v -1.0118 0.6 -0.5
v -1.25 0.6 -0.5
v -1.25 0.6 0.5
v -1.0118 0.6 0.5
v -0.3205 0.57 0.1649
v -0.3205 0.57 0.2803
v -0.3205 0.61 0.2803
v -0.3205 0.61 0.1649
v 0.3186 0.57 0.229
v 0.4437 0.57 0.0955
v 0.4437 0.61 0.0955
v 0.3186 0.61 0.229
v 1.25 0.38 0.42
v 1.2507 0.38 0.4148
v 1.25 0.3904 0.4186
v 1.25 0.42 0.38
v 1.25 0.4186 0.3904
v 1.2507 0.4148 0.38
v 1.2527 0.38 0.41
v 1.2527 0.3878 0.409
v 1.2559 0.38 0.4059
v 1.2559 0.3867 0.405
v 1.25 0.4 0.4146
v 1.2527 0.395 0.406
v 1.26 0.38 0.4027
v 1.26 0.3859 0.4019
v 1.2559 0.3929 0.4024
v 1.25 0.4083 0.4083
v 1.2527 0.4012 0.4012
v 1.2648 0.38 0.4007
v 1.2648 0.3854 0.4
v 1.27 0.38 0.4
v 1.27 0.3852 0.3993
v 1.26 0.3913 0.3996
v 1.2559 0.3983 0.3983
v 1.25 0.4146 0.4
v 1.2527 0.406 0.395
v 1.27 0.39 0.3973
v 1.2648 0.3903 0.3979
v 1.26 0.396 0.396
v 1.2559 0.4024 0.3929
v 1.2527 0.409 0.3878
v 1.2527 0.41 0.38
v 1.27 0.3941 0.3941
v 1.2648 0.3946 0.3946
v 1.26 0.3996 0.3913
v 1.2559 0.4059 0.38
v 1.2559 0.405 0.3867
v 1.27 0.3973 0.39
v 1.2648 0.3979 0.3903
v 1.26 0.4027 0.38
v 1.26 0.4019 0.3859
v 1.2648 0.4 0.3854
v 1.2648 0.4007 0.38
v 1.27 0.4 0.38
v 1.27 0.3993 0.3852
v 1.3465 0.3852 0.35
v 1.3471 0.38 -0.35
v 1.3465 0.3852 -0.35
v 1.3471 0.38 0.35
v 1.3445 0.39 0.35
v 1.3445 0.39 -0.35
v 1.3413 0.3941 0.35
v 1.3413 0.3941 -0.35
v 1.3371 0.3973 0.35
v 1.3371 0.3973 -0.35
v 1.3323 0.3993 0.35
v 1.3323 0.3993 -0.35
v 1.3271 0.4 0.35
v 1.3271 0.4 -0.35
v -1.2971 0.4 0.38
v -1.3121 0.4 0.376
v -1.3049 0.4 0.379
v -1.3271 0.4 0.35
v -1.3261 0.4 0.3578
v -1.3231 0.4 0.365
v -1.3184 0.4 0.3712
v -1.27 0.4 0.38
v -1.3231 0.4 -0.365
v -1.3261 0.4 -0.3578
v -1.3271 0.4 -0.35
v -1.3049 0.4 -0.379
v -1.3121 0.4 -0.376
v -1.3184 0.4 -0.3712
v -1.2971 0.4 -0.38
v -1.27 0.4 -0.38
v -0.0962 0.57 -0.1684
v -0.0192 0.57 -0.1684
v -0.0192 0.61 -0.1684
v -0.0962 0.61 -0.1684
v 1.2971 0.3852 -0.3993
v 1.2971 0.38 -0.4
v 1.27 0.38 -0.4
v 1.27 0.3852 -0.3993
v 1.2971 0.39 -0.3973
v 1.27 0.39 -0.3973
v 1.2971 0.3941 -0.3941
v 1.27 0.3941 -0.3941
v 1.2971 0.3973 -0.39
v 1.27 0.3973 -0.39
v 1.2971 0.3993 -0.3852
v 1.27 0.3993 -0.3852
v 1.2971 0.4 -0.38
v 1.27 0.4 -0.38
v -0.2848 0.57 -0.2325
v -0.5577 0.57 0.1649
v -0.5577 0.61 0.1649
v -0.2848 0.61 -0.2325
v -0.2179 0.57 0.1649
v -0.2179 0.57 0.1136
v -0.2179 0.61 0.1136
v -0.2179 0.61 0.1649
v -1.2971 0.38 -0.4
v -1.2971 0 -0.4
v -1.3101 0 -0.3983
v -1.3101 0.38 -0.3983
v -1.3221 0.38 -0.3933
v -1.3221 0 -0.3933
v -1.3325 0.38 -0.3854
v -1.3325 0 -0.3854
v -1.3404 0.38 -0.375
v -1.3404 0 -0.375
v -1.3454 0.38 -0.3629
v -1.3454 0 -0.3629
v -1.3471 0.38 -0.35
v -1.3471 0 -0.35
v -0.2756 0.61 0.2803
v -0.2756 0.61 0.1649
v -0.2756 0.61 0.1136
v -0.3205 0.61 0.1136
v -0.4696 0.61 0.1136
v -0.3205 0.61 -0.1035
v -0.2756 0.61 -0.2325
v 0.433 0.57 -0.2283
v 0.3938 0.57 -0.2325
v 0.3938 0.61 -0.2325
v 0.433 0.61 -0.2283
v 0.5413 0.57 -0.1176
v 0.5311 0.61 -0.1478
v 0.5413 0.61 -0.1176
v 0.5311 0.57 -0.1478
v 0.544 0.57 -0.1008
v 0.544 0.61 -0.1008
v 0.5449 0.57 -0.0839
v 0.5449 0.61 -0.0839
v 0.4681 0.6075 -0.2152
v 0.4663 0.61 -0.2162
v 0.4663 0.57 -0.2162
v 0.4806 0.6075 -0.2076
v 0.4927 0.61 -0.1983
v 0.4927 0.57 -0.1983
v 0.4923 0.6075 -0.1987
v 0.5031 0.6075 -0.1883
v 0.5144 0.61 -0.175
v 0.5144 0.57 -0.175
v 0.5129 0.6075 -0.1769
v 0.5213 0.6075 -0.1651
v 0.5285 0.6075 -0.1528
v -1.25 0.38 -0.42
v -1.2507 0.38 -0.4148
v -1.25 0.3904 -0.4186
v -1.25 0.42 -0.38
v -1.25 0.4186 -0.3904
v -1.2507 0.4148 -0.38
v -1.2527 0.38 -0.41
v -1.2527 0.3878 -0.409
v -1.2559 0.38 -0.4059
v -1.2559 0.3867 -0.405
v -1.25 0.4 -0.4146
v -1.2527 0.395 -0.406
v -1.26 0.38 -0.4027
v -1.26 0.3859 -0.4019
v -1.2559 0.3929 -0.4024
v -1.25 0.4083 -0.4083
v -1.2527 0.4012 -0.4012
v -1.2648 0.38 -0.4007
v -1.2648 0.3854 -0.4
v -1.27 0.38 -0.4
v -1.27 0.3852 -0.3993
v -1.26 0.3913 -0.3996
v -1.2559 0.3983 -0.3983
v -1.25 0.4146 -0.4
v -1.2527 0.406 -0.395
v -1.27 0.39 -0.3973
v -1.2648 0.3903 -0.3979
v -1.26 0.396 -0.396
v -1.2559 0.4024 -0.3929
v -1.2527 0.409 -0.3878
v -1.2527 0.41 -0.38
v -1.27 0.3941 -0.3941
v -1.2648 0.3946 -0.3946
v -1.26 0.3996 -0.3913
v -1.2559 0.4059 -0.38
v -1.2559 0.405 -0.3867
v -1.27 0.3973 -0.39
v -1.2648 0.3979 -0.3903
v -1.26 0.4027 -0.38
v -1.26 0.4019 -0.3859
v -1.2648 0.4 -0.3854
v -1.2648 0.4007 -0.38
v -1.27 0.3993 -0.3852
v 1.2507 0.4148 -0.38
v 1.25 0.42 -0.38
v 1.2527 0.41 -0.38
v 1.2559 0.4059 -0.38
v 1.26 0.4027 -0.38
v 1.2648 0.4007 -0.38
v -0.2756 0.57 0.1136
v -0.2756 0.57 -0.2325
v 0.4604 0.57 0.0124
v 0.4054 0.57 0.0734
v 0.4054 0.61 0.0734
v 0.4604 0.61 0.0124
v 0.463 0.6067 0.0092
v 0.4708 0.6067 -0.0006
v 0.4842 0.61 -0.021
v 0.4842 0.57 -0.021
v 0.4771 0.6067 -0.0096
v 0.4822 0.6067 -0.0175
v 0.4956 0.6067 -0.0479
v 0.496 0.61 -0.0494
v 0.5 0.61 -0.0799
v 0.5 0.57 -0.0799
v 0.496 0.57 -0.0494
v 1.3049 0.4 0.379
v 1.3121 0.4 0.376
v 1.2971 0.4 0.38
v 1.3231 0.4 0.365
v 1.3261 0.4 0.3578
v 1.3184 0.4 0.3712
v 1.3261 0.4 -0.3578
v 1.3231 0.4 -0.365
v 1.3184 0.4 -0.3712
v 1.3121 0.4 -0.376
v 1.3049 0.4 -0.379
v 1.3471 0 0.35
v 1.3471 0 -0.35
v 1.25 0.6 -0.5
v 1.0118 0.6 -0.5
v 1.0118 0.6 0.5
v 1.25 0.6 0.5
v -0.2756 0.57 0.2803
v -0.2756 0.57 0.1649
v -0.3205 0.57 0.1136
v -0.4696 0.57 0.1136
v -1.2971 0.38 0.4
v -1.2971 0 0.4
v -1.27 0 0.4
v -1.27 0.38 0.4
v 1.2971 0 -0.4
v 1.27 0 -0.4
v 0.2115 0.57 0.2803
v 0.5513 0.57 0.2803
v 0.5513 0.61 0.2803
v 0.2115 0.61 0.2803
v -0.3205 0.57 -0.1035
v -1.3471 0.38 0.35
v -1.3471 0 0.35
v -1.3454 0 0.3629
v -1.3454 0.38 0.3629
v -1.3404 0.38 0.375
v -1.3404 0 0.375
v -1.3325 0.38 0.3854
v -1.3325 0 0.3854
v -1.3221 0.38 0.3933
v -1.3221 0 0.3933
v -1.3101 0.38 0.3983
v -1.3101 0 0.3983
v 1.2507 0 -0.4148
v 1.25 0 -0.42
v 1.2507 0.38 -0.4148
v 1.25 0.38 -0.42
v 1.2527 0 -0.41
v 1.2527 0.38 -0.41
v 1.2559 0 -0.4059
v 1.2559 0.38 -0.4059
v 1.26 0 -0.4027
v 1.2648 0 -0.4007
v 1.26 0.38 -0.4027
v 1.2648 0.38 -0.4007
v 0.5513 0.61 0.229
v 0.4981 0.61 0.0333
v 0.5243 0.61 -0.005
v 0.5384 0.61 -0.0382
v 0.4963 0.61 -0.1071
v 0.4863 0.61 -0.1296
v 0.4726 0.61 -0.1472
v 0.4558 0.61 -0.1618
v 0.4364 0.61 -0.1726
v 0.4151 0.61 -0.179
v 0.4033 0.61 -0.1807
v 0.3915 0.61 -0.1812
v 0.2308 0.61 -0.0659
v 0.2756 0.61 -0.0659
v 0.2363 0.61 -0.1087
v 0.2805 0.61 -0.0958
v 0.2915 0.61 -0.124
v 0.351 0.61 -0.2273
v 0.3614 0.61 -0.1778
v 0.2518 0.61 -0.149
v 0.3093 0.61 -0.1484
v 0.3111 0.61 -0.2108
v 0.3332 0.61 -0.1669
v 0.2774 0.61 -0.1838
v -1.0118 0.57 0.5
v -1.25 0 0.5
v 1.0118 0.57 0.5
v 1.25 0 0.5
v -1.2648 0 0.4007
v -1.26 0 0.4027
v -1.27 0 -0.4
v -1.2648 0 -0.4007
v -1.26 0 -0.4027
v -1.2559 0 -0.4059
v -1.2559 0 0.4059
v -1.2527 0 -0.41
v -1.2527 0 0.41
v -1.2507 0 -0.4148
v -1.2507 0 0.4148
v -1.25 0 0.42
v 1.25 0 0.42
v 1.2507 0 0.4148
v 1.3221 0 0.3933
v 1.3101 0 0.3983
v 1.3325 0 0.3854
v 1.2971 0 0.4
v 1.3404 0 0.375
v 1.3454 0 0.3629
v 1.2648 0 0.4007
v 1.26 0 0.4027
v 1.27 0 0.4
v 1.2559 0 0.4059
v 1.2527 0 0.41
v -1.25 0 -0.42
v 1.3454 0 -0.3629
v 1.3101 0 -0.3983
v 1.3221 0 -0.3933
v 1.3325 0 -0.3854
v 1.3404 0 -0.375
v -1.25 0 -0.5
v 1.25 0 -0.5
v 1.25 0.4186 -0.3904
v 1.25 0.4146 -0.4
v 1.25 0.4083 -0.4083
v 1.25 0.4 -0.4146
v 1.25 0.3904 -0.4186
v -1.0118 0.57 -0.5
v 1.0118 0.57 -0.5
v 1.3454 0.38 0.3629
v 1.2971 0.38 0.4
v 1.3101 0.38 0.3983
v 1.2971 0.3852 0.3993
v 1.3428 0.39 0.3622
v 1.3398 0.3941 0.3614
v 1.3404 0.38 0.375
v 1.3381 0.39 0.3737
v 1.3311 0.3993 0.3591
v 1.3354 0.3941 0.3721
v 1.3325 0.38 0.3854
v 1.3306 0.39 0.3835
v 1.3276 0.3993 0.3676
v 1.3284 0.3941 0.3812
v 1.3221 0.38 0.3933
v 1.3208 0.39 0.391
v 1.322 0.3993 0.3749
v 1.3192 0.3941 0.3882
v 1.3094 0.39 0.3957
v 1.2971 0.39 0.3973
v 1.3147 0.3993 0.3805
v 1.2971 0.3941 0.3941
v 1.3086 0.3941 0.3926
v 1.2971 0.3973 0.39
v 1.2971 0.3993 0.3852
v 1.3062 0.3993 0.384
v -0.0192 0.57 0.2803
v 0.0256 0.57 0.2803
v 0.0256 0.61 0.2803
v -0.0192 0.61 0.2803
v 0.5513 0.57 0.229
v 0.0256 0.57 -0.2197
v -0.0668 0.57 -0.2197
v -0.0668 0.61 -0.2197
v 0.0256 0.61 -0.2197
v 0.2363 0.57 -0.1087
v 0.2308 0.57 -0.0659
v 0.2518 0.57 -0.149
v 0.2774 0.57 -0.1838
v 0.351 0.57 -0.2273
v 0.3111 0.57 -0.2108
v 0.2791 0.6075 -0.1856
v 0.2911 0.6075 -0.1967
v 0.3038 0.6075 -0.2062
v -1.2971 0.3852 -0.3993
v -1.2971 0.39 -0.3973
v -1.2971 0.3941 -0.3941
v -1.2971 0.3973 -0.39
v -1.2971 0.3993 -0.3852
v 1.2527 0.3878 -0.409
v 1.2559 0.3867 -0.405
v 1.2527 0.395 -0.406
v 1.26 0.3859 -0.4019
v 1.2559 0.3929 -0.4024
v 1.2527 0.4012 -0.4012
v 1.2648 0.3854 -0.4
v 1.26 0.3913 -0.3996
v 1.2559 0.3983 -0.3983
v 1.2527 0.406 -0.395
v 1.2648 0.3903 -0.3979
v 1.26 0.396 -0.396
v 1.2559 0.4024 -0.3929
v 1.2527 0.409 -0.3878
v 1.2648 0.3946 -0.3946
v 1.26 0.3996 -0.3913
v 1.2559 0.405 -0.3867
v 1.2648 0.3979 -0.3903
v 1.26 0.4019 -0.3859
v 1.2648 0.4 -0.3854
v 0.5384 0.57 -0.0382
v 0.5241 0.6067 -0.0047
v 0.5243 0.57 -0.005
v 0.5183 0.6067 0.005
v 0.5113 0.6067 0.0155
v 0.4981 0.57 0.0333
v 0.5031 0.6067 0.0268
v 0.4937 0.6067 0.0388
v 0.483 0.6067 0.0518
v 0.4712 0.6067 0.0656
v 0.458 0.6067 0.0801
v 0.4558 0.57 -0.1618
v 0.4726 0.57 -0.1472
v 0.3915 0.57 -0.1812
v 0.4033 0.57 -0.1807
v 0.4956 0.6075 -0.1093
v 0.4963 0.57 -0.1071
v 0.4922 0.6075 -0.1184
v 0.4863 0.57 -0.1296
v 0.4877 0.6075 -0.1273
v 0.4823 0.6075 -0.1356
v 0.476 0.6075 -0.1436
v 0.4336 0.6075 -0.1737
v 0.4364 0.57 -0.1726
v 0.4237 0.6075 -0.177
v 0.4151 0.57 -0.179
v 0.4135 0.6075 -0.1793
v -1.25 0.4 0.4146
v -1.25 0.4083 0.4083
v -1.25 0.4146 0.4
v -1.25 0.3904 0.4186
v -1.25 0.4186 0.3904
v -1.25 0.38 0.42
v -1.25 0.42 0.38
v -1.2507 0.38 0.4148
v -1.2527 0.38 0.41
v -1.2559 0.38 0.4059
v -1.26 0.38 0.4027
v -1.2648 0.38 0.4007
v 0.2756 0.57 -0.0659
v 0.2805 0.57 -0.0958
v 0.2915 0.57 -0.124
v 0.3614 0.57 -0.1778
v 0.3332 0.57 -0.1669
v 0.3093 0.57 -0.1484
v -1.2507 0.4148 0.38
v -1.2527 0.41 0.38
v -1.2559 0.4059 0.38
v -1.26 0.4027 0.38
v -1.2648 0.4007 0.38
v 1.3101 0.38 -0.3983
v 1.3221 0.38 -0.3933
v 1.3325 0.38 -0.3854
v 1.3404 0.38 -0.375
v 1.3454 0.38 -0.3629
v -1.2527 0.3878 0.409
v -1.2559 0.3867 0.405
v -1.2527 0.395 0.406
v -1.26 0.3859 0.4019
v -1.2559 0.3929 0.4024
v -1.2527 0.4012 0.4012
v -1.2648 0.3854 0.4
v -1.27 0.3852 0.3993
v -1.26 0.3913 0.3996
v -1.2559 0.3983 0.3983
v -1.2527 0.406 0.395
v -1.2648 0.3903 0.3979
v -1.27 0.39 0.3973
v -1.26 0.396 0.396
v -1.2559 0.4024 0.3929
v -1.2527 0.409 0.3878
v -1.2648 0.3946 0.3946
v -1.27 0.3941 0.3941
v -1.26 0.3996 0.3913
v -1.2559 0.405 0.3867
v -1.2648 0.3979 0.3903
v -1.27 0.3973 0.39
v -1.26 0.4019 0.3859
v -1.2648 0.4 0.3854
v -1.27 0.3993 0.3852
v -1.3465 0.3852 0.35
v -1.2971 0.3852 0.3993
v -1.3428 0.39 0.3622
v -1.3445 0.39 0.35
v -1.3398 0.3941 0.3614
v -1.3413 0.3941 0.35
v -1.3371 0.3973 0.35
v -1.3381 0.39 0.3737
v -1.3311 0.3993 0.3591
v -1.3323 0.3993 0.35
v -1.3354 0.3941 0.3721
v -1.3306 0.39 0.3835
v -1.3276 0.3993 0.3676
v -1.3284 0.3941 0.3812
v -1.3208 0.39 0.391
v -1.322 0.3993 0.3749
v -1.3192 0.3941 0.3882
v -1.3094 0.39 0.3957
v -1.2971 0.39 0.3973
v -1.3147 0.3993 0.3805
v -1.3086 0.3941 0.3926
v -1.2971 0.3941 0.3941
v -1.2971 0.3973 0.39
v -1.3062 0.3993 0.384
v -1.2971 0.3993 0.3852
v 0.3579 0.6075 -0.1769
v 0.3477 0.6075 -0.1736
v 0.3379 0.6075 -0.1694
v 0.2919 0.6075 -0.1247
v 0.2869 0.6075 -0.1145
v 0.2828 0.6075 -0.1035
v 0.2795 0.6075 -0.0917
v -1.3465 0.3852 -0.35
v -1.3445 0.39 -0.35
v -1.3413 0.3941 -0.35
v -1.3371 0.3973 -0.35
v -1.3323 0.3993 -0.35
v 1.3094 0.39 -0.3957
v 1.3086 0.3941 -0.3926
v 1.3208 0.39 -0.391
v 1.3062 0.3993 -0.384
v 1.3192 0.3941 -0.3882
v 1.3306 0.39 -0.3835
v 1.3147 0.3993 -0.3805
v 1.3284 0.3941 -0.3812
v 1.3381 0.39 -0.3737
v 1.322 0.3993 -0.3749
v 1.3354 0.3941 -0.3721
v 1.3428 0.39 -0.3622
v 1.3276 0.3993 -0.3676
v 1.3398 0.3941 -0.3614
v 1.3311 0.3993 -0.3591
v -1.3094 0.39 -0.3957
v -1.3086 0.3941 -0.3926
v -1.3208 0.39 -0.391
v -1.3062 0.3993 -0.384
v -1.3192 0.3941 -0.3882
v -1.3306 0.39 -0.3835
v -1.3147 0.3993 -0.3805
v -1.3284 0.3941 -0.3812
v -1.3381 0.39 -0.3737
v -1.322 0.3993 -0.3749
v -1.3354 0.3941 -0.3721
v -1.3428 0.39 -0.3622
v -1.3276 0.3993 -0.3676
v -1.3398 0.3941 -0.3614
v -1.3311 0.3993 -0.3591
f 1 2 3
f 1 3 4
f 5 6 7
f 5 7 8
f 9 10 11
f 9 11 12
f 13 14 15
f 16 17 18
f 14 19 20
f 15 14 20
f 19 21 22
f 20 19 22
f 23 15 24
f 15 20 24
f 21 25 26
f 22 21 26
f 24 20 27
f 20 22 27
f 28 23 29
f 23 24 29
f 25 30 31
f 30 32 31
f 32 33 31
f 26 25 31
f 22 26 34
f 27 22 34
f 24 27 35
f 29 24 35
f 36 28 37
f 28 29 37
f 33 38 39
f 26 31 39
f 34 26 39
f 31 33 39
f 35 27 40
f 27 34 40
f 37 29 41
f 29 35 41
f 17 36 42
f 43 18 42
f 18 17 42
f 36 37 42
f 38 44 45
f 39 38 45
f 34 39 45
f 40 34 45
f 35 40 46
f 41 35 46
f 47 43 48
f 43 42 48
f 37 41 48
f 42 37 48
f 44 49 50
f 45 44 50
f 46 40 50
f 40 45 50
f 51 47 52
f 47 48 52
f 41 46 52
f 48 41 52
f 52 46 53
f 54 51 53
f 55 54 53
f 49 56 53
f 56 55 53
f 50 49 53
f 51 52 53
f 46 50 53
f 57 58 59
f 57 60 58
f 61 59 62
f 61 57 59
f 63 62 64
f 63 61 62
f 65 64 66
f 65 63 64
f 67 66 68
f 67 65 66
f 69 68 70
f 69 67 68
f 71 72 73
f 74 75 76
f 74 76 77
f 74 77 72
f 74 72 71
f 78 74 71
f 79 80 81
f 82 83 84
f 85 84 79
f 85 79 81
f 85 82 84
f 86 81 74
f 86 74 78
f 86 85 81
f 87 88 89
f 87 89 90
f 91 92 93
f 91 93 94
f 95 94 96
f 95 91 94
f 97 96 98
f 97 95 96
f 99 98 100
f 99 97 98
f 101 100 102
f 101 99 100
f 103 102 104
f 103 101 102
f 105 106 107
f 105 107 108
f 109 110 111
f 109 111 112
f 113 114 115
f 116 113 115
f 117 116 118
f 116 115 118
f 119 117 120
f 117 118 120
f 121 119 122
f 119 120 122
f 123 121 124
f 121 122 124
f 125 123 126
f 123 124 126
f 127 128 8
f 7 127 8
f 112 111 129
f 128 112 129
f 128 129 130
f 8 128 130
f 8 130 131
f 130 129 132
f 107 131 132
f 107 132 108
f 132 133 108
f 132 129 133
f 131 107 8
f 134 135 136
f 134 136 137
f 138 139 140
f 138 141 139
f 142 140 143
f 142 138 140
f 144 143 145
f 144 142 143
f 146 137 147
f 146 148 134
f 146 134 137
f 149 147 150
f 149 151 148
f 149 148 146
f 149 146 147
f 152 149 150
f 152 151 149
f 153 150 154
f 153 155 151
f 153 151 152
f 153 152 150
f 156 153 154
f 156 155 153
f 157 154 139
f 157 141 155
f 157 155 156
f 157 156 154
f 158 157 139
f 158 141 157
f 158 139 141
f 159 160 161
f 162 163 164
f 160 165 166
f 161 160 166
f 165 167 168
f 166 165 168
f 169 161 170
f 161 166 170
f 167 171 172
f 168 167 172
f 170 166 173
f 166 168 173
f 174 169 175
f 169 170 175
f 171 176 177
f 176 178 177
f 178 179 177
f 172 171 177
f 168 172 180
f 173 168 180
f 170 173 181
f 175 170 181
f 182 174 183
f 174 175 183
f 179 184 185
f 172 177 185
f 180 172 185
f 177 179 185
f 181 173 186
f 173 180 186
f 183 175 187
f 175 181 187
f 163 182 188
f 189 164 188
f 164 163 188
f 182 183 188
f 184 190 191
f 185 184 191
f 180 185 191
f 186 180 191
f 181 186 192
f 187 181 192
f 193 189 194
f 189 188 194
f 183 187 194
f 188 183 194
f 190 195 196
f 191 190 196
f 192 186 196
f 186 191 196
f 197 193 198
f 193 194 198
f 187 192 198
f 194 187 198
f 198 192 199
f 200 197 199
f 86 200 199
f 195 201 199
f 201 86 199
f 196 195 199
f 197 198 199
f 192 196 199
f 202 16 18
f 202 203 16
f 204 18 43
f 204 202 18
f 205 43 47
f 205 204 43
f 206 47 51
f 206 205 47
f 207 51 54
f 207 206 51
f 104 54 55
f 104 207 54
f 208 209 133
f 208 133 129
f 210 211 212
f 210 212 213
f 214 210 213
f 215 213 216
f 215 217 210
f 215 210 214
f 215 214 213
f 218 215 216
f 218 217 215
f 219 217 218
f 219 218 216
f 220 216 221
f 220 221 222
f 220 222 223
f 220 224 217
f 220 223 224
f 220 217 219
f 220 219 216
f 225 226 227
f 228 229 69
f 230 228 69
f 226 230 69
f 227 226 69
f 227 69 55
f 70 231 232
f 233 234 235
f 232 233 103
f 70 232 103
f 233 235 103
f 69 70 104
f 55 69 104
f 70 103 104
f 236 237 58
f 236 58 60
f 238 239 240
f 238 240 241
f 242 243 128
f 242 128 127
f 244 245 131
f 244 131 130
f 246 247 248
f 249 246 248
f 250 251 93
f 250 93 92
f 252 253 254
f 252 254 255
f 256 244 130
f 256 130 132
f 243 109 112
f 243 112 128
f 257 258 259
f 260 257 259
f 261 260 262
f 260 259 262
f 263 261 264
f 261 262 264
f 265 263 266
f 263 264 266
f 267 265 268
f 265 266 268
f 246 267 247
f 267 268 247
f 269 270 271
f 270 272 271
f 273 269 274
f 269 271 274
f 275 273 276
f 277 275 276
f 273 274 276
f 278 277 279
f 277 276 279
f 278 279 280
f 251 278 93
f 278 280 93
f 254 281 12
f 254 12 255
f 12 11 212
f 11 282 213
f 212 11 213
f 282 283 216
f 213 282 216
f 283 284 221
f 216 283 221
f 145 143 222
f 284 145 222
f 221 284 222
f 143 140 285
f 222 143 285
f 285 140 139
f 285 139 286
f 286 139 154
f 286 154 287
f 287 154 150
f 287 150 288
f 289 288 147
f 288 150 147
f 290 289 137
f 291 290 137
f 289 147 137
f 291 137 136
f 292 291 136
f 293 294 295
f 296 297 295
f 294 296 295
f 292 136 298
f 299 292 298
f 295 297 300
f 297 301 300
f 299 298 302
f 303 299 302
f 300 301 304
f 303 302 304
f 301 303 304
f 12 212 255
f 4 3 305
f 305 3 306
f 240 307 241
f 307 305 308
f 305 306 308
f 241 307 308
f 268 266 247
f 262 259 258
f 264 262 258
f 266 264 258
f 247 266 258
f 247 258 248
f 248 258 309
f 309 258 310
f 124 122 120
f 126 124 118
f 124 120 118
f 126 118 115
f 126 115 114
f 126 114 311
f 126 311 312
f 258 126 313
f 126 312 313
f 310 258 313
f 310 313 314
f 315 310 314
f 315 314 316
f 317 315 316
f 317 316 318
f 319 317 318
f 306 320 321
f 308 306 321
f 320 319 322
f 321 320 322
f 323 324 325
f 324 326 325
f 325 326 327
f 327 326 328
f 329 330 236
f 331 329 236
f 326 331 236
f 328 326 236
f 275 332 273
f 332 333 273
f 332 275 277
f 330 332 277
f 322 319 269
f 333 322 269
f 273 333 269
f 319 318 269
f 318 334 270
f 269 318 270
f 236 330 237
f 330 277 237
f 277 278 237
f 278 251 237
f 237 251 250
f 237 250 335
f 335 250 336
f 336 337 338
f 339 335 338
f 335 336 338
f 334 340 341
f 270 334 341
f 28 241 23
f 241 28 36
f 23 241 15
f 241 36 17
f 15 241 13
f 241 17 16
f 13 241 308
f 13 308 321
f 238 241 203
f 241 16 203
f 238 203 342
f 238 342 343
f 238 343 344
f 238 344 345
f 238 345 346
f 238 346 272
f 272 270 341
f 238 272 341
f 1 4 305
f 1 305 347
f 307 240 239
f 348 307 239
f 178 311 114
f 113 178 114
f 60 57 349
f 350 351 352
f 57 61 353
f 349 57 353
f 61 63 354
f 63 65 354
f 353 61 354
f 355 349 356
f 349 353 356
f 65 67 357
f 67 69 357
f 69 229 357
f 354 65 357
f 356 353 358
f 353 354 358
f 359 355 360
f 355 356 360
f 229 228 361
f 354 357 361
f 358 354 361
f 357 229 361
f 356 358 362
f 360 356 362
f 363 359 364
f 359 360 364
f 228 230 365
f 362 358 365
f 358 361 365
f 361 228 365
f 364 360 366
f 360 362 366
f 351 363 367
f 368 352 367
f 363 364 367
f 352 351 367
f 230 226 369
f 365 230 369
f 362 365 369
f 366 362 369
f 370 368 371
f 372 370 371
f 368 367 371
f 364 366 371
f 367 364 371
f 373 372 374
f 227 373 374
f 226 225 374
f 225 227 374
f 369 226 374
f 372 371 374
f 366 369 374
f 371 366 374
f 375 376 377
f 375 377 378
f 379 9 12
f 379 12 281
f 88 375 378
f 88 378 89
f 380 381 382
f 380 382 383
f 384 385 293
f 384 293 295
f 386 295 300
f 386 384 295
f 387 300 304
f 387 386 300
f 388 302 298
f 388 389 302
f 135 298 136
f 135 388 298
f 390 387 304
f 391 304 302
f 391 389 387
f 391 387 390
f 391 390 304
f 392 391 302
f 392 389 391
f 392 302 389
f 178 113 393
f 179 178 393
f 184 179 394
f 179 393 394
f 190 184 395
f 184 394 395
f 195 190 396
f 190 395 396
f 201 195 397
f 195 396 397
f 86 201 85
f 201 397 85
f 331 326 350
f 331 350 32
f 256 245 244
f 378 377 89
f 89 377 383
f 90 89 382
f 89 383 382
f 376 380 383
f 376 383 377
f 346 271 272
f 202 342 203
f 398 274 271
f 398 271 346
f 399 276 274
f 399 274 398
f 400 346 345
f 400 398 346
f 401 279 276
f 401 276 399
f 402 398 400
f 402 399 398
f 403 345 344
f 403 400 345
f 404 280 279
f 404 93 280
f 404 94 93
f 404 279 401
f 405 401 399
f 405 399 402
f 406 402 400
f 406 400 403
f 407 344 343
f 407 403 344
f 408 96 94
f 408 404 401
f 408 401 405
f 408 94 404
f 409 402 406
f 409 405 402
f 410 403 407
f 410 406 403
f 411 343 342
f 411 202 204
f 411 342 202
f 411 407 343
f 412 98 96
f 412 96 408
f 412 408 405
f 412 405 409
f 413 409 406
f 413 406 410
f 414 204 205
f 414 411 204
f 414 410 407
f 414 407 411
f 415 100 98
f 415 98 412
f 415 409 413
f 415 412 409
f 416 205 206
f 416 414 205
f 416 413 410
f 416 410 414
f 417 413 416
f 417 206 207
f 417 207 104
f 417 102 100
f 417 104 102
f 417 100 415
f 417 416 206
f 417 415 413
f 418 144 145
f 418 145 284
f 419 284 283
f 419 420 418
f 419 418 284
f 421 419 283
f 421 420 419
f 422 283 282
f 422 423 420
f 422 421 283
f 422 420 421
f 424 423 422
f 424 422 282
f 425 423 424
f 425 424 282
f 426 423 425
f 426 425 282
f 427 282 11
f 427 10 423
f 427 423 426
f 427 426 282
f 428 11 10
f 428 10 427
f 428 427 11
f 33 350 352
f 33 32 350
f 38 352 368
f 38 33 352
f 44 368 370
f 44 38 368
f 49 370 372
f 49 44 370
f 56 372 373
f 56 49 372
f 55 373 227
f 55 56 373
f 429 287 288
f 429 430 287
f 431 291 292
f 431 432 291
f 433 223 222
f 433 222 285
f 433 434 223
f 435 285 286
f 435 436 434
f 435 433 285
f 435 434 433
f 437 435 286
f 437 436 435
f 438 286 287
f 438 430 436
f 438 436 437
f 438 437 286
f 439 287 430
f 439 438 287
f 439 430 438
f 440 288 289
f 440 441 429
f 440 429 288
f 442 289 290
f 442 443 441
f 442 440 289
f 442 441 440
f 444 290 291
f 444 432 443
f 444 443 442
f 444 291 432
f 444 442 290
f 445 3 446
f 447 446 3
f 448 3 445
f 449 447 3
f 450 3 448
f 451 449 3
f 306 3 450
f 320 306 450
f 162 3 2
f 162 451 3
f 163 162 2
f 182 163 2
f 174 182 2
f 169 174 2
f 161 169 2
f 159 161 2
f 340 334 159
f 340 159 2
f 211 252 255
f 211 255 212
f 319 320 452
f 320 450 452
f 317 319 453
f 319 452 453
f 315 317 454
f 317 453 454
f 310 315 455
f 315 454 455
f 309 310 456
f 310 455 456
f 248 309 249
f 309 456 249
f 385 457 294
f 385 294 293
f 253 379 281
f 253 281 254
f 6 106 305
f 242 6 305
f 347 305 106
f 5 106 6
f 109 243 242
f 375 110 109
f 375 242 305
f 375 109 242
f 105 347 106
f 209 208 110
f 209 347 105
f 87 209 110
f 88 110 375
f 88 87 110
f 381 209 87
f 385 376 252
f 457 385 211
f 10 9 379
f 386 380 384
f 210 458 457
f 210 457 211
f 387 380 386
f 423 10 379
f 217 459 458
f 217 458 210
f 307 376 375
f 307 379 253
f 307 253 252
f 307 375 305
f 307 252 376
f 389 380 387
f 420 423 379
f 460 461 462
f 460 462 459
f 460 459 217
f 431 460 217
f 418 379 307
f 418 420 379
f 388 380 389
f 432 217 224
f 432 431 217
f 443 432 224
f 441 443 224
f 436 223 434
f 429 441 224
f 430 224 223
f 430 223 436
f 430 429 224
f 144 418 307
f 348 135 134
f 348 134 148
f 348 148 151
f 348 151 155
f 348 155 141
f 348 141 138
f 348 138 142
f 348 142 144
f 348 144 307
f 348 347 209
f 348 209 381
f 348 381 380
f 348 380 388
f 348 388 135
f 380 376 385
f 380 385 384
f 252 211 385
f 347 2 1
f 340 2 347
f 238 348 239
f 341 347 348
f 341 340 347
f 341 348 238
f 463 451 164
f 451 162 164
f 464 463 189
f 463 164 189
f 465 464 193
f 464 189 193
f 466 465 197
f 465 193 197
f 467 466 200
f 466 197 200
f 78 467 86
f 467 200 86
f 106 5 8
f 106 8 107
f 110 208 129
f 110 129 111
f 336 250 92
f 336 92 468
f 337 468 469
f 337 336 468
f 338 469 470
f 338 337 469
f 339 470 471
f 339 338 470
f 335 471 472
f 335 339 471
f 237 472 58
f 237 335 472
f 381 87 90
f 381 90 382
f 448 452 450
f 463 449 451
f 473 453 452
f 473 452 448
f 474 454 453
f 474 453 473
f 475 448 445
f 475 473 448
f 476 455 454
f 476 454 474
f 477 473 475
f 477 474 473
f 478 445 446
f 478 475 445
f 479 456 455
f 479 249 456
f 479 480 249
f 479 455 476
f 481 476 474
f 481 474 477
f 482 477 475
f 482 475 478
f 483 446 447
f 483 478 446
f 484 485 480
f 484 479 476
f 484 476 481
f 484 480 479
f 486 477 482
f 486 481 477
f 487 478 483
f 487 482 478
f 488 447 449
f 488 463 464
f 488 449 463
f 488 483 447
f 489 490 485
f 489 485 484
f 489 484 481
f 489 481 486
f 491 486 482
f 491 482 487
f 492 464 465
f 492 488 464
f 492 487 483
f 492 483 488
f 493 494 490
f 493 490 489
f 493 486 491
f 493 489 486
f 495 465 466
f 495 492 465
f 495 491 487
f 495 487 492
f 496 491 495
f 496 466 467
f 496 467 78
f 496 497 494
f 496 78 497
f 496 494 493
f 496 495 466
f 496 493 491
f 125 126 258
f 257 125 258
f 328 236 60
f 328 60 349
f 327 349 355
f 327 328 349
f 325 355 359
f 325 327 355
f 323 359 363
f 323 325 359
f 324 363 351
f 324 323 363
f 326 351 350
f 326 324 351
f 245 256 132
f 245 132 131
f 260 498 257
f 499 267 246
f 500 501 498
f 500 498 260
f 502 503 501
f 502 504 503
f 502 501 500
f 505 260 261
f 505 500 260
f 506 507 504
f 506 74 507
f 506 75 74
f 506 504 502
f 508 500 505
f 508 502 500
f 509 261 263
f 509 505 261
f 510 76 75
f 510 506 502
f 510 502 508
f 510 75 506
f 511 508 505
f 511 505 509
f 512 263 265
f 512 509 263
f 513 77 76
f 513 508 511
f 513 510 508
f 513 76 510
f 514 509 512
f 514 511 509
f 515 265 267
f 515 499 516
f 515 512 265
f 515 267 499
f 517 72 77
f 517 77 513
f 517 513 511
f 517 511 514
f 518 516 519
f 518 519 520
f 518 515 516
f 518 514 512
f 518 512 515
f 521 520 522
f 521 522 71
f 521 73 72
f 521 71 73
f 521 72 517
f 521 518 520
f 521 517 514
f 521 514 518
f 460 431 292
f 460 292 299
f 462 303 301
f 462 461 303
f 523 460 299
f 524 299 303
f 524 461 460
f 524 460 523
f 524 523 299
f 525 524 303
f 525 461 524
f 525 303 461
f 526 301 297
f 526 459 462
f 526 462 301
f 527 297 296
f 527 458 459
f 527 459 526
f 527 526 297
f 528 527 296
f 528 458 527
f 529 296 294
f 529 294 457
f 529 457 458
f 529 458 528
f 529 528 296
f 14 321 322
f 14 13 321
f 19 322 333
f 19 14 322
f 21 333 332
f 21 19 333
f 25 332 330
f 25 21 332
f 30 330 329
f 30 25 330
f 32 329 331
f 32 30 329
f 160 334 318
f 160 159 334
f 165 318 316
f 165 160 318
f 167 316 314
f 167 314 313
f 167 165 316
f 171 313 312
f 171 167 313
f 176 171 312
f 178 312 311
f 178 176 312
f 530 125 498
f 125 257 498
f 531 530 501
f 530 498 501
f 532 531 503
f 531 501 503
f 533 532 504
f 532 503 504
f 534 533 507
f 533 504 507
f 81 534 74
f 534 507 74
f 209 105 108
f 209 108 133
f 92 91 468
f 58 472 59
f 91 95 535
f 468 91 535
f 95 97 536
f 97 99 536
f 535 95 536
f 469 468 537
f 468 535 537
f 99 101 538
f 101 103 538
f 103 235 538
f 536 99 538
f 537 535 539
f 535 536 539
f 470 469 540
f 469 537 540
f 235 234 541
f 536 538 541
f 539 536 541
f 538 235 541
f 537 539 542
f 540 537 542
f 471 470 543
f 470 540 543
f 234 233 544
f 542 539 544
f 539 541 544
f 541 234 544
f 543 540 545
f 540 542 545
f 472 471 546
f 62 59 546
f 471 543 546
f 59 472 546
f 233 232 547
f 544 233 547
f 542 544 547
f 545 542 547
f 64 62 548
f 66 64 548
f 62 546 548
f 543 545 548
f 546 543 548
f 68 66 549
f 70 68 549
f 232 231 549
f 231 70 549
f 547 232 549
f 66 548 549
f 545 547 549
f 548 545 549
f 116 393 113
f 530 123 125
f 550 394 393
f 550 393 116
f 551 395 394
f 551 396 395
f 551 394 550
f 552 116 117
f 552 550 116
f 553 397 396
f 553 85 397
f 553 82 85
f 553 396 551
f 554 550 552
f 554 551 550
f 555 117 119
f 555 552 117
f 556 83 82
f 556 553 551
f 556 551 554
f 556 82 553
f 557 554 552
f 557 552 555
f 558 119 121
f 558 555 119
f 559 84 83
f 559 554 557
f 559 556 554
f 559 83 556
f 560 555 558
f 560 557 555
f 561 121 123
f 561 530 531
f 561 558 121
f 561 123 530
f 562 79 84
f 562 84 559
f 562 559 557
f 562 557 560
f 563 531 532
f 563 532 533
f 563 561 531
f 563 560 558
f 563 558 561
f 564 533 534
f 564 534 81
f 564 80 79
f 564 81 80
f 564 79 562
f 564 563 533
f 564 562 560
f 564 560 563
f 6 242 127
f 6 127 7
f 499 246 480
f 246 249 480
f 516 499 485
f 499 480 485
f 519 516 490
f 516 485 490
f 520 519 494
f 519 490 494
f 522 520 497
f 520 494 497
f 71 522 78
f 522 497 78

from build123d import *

# Parameters (mm, degrees)
ESQUISSE1_W             = 2.5
ESQUISSE1_H             = 1
BOSS_EXTRU_1_DEPTH      = 0.6
ESQUISSE2_W             = 2.023603034
ESQUISSE2_H             = 1
ENL_V_MAT_EXTRU_1_DEPTH = 0.03
BOSS_EXTRU_2_DEPTH      = 0.4
CONG_1_R                = 0.02
CONG_1_OF_SYM_TRIE2_R   = 0.02
BOSS_EXTRU_3_DEPTH      = 0.04


with BuildPart() as part:
    # Esquisse1 → Boss.-Extru.1 (new body)
    with BuildSketch(Plane(origin=(0, 0, 0), x_dir=(1, 0, 0), z_dir=(0, 1, 0))):
        Rectangle(ESQUISSE1_W, ESQUISSE1_H)
    extrude(amount=BOSS_EXTRU_1_DEPTH)

    # Esquisse2 → Enlèv. mat.-Extru.1 (cut)
    with BuildSketch(Plane(origin=(0, 0.6, 0), x_dir=(1, 0, 0), z_dir=(0, 1, 0))):
        Rectangle(ESQUISSE2_W, ESQUISSE2_H)
    extrude(amount=-ENL_V_MAT_EXTRU_1_DEPTH, mode=Mode.SUBTRACT)

    # Esquisse3 → Boss.-Extru.2 (add)
    with BuildSketch(Plane(origin=(0, 0, 0), x_dir=(1, 0, 0), z_dir=(0, 1, 0))):
        with BuildLine():
            Line((1.25, 0.4), (1.297141448, 0.4))
            ThreePointArc((1.297141448, 0.4), (1.332496787, 0.385355339), (1.347141448, 0.35))
            Line((1.347141448, 0.35), (1.347141448, -0.35))
            ThreePointArc((1.347141448, -0.35), (1.332496787, -0.385355339), (1.297141448, -0.4))
            Line((1.297141448, -0.4), (1.25, -0.4))
            Line((1.25, -0.4), (1.25, 0.4))
        make_face()
    boss_extru_2 = extrude(amount=BOSS_EXTRU_2_DEPTH)

    # Congé1
    cong_1_edges = [part.edges().sort_by_distance(p)[0] for p in [
        (1.25, 0.2, -0.4),
        (1.25, 0.2, 0.4),
        (1.25, 0.4, 0),
        (1.273570724, 0.4, 0.4),
        (1.332496787, 0.4, 0.385355339),
        (1.347141448, 0.4, 0),
        (1.332496787, 0.4, -0.385355339),
        (1.273570724, 0.4, -0.4),
    ]]
    fillet(cong_1_edges, radius=CONG_1_R)

    # Symétrie2: Boss.-Extru.2 across plane
    add(boss_extru_2.mirror(Plane(origin=(0, 0, 0), x_dir=(0, 0, 1), z_dir=(1, 0, 0))))

    # Congé1 of Symétrie2
    cong_1_of_sym_trie2_edges = [part.edges().sort_by_distance(p)[0] for p in [
        (-1.25, 0.2, -0.4),
        (-1.25, 0.2, 0.4),
        (-1.25, 0.4, 0),
        (-1.273570724, 0.4, 0.4),
        (-1.332496787, 0.4, 0.385355339),
        (-1.347141448, 0.4, 0),
        (-1.332496787, 0.4, -0.385355339),
        (-1.273570724, 0.4, -0.4),
    ]]
    fillet(cong_1_of_sym_trie2_edges, radius=CONG_1_OF_SYM_TRIE2_R)

    # Esquisse4 → Boss.-Extru.3 (add)
    # profile 1 of 3: a face of its own
    with BuildSketch(Plane(origin=(0, 0.57, 0), x_dir=(1, 0, 0), z_dir=(0, 1, 0))):
        with BuildLine():
            Line((0.275641026, 0.065854324), (0.230769231, 0.065854324))
            add(Edge.make_bspline(
                [(0.230769231, 0.065854324), (0.231061681, 0.071807307), (0.231636046, 0.08349881), (0.234325802, 0.100545082), (0.238174498, 0.116838625), (0.243616135, 0.132248612), (0.250374174, 0.146911299), (0.258478464, 0.160768444), (0.268077586, 0.173767185), (0.278964262, 0.18578702), (0.290788353, 0.196813816), (0.303546344, 0.206335994), (0.316952777, 0.214381375), (0.330966977, 0.221107267), (0.345747057, 0.226155816), (0.361158894, 0.229901765), (0.377270199, 0.232155528), (0.388247345, 0.232397784), (0.393830128, 0.23252099)],
                knots=[0, 0, 0, 0, 1.10065271, 2.161652631, 3.183658789, 4.190468796, 5.17591951, 6.163126047, 7.15150782, 8.156236427, 9.156009102, 10.134482811, 11.092018607, 12.041330605, 13.001268258, 13.972401359, 14.968799086, 16, 16, 16, 16], degree=3))
            add(Edge.make_bspline(
                [(0.393830128, 0.23252099), (0.39931271, 0.232392639), (0.410085788, 0.232140434), (0.425808933, 0.229974573), (0.440777118, 0.226582346), (0.454961085, 0.221823), (0.468247665, 0.215425225), (0.480736672, 0.207739862), (0.492576787, 0.198851315), (0.503234899, 0.188386485), (0.513021768, 0.177214715), (0.521464947, 0.165287872), (0.528695399, 0.152969403), (0.53472221, 0.140165374), (0.539158802, 0.126755227), (0.542527117, 0.112934198), (0.544431033, 0.098559225), (0.544723237, 0.088829717), (0.544871795, 0.08388317)],
                knots=[0, 0, 0, 0, 1.111607364, 2.184268762, 3.212621178, 4.221274766, 5.211760367, 6.196651075, 7.1921475, 8.207485113, 9.220403448, 10.201281604, 11.166441695, 12.114753415, 13.065576456, 14.026450734, 14.996634279, 16, 16, 16, 16], degree=3))
            add(Edge.make_bspline(
                [(0.544871795, 0.08388317), (0.5446299, 0.076919193), (0.544150356, 0.063113449), (0.540048302, 0.042825611), (0.533641657, 0.023169408), (0.525927749, 0.007349794), (0.518145972, -0.005397848), (0.511133471, -0.015893378), (0.502924212, -0.027194159), (0.493398712, -0.03926235), (0.482754016, -0.052192479), (0.470893707, -0.065976736), (0.45773321, -0.080472703), (0.448496281, -0.090373503), (0.443709936, -0.09550385)],
                knots=[0, 0, 0, 0, 1.184426356, 2.348067706, 3.509069118, 4.696110526, 5.333549288, 6.050745305, 6.844228056, 7.710549037, 8.667450064, 9.695053472, 10.805634456, 12, 12, 12, 12], degree=3))
            Line((0.443709936, -0.09550385), (0.318609776, -0.229017471))
            Line((0.318609776, -0.229017471), (0.551282051, -0.229017471))
            Line((0.551282051, -0.229017471), (0.551282051, -0.280299523))
            Line((0.551282051, -0.280299523), (0.211538462, -0.280299523))
            Line((0.211538462, -0.280299523), (0.405448718, -0.073368433))
            add(Edge.make_bspline(
                [(0.405448718, -0.073368433), (0.410169845, -0.068440103), (0.419238163, -0.058973791), (0.432064245, -0.045153368), (0.443584101, -0.032332005), (0.4538723, -0.020533927), (0.462705658, -0.00958656), (0.470544548, 0.000155541), (0.476825347, 0.009120462), (0.483641832, 0.019511978), (0.490243829, 0.032199452), (0.495917023, 0.047704265), (0.499376287, 0.063665301), (0.499791263, 0.074451306), (0.5, 0.079876759)],
                knots=[0, 0, 0, 0, 1.329631726, 2.553950428, 3.673215718, 4.687767853, 5.603093632, 6.413772471, 7.123043292, 7.734684054, 8.834405432, 9.900288307, 10.943827018, 12, 12, 12, 12], degree=3))
            add(Edge.make_bspline(
                [(0.5, 0.079876759), (0.49990918, 0.083288388), (0.49973019, 0.090012052), (0.498150519, 0.099870018), (0.495763304, 0.109379277), (0.492342553, 0.11856908), (0.487827304, 0.12734703), (0.482331107, 0.135723813), (0.47598967, 0.143822236), (0.468653774, 0.151415565), (0.460594985, 0.158370023), (0.452081521, 0.164530606), (0.443074363, 0.169679051), (0.433611489, 0.17389955), (0.423719279, 0.177210319), (0.413378601, 0.179504402), (0.402618027, 0.180944757), (0.395270385, 0.181139638), (0.391526442, 0.181238939)],
                knots=[0, 0, 0, 0, 0.991446411, 1.95395049, 2.89581595, 3.838931463, 4.798493298, 5.75982156, 6.748411868, 7.785213223, 8.824556874, 9.840280684, 10.836137867, 11.835679398, 12.848801643, 13.863922112, 14.911575587, 16, 16, 16, 16], degree=3))
            add(Edge.make_bspline(
                [(0.391526442, 0.181238939), (0.387616323, 0.181136791), (0.379937495, 0.180936191), (0.368663348, 0.179532953), (0.357908237, 0.177112119), (0.347645108, 0.173801165), (0.337856595, 0.169592801), (0.328590303, 0.164351123), (0.319867034, 0.158096338), (0.311670387, 0.15100483), (0.30411839, 0.143109459), (0.297483122, 0.134308036), (0.291685406, 0.124761262), (0.286626944, 0.114494898), (0.282518988, 0.103415786), (0.279379967, 0.091563257), (0.276896132, 0.078988774), (0.276066343, 0.07030519), (0.275641026, 0.065854324)],
                knots=[0, 0, 0, 0, 1.031018746, 2.02475058, 2.990194455, 3.934040569, 4.864654155, 5.795059489, 6.735614925, 7.690564532, 8.649604399, 9.611025574, 10.590972636, 11.591080095, 12.624614302, 13.701020113, 14.821632451, 16, 16, 16, 16], degree=3))
        make_face()
    # profile 2 of 3: a face of its own
    with BuildSketch(Plane(origin=(0, 0.57, 0), x_dir=(1, 0, 0), z_dir=(0, 1, 0))):
        Polygon((-0.066806891, 0.219700477), (0.025641026, 0.219700477), (0.025641026, -0.280299523), (-0.019230769, -0.280299523), (-0.019230769, 0.168418426), (-0.096153846, 0.168418426), align=None)
    # profile 3 of 3: a face of its own
    with BuildSketch(Plane(origin=(0, 0.57, 0), x_dir=(1, 0, 0), z_dir=(0, 1, 0))):
        Polygon((-0.284755609, 0.23252099), (-0.275641026, 0.23252099), (-0.275641026, -0.113632856), (-0.217948718, -0.113632856), (-0.217948718, -0.164914907), (-0.275641026, -0.164914907), (-0.275641026, -0.280299523), (-0.320512821, -0.280299523), (-0.320512821, -0.164914907), (-0.557692308, -0.164914907), align=None)
        Polygon((-0.320512821, -0.113632856), (-0.320512821, 0.10351458), (-0.469551282, -0.113632856), align=None, mode=Mode.SUBTRACT)
    extrude(amount=BOSS_EXTRU_3_DEPTH)


solid = part.part
